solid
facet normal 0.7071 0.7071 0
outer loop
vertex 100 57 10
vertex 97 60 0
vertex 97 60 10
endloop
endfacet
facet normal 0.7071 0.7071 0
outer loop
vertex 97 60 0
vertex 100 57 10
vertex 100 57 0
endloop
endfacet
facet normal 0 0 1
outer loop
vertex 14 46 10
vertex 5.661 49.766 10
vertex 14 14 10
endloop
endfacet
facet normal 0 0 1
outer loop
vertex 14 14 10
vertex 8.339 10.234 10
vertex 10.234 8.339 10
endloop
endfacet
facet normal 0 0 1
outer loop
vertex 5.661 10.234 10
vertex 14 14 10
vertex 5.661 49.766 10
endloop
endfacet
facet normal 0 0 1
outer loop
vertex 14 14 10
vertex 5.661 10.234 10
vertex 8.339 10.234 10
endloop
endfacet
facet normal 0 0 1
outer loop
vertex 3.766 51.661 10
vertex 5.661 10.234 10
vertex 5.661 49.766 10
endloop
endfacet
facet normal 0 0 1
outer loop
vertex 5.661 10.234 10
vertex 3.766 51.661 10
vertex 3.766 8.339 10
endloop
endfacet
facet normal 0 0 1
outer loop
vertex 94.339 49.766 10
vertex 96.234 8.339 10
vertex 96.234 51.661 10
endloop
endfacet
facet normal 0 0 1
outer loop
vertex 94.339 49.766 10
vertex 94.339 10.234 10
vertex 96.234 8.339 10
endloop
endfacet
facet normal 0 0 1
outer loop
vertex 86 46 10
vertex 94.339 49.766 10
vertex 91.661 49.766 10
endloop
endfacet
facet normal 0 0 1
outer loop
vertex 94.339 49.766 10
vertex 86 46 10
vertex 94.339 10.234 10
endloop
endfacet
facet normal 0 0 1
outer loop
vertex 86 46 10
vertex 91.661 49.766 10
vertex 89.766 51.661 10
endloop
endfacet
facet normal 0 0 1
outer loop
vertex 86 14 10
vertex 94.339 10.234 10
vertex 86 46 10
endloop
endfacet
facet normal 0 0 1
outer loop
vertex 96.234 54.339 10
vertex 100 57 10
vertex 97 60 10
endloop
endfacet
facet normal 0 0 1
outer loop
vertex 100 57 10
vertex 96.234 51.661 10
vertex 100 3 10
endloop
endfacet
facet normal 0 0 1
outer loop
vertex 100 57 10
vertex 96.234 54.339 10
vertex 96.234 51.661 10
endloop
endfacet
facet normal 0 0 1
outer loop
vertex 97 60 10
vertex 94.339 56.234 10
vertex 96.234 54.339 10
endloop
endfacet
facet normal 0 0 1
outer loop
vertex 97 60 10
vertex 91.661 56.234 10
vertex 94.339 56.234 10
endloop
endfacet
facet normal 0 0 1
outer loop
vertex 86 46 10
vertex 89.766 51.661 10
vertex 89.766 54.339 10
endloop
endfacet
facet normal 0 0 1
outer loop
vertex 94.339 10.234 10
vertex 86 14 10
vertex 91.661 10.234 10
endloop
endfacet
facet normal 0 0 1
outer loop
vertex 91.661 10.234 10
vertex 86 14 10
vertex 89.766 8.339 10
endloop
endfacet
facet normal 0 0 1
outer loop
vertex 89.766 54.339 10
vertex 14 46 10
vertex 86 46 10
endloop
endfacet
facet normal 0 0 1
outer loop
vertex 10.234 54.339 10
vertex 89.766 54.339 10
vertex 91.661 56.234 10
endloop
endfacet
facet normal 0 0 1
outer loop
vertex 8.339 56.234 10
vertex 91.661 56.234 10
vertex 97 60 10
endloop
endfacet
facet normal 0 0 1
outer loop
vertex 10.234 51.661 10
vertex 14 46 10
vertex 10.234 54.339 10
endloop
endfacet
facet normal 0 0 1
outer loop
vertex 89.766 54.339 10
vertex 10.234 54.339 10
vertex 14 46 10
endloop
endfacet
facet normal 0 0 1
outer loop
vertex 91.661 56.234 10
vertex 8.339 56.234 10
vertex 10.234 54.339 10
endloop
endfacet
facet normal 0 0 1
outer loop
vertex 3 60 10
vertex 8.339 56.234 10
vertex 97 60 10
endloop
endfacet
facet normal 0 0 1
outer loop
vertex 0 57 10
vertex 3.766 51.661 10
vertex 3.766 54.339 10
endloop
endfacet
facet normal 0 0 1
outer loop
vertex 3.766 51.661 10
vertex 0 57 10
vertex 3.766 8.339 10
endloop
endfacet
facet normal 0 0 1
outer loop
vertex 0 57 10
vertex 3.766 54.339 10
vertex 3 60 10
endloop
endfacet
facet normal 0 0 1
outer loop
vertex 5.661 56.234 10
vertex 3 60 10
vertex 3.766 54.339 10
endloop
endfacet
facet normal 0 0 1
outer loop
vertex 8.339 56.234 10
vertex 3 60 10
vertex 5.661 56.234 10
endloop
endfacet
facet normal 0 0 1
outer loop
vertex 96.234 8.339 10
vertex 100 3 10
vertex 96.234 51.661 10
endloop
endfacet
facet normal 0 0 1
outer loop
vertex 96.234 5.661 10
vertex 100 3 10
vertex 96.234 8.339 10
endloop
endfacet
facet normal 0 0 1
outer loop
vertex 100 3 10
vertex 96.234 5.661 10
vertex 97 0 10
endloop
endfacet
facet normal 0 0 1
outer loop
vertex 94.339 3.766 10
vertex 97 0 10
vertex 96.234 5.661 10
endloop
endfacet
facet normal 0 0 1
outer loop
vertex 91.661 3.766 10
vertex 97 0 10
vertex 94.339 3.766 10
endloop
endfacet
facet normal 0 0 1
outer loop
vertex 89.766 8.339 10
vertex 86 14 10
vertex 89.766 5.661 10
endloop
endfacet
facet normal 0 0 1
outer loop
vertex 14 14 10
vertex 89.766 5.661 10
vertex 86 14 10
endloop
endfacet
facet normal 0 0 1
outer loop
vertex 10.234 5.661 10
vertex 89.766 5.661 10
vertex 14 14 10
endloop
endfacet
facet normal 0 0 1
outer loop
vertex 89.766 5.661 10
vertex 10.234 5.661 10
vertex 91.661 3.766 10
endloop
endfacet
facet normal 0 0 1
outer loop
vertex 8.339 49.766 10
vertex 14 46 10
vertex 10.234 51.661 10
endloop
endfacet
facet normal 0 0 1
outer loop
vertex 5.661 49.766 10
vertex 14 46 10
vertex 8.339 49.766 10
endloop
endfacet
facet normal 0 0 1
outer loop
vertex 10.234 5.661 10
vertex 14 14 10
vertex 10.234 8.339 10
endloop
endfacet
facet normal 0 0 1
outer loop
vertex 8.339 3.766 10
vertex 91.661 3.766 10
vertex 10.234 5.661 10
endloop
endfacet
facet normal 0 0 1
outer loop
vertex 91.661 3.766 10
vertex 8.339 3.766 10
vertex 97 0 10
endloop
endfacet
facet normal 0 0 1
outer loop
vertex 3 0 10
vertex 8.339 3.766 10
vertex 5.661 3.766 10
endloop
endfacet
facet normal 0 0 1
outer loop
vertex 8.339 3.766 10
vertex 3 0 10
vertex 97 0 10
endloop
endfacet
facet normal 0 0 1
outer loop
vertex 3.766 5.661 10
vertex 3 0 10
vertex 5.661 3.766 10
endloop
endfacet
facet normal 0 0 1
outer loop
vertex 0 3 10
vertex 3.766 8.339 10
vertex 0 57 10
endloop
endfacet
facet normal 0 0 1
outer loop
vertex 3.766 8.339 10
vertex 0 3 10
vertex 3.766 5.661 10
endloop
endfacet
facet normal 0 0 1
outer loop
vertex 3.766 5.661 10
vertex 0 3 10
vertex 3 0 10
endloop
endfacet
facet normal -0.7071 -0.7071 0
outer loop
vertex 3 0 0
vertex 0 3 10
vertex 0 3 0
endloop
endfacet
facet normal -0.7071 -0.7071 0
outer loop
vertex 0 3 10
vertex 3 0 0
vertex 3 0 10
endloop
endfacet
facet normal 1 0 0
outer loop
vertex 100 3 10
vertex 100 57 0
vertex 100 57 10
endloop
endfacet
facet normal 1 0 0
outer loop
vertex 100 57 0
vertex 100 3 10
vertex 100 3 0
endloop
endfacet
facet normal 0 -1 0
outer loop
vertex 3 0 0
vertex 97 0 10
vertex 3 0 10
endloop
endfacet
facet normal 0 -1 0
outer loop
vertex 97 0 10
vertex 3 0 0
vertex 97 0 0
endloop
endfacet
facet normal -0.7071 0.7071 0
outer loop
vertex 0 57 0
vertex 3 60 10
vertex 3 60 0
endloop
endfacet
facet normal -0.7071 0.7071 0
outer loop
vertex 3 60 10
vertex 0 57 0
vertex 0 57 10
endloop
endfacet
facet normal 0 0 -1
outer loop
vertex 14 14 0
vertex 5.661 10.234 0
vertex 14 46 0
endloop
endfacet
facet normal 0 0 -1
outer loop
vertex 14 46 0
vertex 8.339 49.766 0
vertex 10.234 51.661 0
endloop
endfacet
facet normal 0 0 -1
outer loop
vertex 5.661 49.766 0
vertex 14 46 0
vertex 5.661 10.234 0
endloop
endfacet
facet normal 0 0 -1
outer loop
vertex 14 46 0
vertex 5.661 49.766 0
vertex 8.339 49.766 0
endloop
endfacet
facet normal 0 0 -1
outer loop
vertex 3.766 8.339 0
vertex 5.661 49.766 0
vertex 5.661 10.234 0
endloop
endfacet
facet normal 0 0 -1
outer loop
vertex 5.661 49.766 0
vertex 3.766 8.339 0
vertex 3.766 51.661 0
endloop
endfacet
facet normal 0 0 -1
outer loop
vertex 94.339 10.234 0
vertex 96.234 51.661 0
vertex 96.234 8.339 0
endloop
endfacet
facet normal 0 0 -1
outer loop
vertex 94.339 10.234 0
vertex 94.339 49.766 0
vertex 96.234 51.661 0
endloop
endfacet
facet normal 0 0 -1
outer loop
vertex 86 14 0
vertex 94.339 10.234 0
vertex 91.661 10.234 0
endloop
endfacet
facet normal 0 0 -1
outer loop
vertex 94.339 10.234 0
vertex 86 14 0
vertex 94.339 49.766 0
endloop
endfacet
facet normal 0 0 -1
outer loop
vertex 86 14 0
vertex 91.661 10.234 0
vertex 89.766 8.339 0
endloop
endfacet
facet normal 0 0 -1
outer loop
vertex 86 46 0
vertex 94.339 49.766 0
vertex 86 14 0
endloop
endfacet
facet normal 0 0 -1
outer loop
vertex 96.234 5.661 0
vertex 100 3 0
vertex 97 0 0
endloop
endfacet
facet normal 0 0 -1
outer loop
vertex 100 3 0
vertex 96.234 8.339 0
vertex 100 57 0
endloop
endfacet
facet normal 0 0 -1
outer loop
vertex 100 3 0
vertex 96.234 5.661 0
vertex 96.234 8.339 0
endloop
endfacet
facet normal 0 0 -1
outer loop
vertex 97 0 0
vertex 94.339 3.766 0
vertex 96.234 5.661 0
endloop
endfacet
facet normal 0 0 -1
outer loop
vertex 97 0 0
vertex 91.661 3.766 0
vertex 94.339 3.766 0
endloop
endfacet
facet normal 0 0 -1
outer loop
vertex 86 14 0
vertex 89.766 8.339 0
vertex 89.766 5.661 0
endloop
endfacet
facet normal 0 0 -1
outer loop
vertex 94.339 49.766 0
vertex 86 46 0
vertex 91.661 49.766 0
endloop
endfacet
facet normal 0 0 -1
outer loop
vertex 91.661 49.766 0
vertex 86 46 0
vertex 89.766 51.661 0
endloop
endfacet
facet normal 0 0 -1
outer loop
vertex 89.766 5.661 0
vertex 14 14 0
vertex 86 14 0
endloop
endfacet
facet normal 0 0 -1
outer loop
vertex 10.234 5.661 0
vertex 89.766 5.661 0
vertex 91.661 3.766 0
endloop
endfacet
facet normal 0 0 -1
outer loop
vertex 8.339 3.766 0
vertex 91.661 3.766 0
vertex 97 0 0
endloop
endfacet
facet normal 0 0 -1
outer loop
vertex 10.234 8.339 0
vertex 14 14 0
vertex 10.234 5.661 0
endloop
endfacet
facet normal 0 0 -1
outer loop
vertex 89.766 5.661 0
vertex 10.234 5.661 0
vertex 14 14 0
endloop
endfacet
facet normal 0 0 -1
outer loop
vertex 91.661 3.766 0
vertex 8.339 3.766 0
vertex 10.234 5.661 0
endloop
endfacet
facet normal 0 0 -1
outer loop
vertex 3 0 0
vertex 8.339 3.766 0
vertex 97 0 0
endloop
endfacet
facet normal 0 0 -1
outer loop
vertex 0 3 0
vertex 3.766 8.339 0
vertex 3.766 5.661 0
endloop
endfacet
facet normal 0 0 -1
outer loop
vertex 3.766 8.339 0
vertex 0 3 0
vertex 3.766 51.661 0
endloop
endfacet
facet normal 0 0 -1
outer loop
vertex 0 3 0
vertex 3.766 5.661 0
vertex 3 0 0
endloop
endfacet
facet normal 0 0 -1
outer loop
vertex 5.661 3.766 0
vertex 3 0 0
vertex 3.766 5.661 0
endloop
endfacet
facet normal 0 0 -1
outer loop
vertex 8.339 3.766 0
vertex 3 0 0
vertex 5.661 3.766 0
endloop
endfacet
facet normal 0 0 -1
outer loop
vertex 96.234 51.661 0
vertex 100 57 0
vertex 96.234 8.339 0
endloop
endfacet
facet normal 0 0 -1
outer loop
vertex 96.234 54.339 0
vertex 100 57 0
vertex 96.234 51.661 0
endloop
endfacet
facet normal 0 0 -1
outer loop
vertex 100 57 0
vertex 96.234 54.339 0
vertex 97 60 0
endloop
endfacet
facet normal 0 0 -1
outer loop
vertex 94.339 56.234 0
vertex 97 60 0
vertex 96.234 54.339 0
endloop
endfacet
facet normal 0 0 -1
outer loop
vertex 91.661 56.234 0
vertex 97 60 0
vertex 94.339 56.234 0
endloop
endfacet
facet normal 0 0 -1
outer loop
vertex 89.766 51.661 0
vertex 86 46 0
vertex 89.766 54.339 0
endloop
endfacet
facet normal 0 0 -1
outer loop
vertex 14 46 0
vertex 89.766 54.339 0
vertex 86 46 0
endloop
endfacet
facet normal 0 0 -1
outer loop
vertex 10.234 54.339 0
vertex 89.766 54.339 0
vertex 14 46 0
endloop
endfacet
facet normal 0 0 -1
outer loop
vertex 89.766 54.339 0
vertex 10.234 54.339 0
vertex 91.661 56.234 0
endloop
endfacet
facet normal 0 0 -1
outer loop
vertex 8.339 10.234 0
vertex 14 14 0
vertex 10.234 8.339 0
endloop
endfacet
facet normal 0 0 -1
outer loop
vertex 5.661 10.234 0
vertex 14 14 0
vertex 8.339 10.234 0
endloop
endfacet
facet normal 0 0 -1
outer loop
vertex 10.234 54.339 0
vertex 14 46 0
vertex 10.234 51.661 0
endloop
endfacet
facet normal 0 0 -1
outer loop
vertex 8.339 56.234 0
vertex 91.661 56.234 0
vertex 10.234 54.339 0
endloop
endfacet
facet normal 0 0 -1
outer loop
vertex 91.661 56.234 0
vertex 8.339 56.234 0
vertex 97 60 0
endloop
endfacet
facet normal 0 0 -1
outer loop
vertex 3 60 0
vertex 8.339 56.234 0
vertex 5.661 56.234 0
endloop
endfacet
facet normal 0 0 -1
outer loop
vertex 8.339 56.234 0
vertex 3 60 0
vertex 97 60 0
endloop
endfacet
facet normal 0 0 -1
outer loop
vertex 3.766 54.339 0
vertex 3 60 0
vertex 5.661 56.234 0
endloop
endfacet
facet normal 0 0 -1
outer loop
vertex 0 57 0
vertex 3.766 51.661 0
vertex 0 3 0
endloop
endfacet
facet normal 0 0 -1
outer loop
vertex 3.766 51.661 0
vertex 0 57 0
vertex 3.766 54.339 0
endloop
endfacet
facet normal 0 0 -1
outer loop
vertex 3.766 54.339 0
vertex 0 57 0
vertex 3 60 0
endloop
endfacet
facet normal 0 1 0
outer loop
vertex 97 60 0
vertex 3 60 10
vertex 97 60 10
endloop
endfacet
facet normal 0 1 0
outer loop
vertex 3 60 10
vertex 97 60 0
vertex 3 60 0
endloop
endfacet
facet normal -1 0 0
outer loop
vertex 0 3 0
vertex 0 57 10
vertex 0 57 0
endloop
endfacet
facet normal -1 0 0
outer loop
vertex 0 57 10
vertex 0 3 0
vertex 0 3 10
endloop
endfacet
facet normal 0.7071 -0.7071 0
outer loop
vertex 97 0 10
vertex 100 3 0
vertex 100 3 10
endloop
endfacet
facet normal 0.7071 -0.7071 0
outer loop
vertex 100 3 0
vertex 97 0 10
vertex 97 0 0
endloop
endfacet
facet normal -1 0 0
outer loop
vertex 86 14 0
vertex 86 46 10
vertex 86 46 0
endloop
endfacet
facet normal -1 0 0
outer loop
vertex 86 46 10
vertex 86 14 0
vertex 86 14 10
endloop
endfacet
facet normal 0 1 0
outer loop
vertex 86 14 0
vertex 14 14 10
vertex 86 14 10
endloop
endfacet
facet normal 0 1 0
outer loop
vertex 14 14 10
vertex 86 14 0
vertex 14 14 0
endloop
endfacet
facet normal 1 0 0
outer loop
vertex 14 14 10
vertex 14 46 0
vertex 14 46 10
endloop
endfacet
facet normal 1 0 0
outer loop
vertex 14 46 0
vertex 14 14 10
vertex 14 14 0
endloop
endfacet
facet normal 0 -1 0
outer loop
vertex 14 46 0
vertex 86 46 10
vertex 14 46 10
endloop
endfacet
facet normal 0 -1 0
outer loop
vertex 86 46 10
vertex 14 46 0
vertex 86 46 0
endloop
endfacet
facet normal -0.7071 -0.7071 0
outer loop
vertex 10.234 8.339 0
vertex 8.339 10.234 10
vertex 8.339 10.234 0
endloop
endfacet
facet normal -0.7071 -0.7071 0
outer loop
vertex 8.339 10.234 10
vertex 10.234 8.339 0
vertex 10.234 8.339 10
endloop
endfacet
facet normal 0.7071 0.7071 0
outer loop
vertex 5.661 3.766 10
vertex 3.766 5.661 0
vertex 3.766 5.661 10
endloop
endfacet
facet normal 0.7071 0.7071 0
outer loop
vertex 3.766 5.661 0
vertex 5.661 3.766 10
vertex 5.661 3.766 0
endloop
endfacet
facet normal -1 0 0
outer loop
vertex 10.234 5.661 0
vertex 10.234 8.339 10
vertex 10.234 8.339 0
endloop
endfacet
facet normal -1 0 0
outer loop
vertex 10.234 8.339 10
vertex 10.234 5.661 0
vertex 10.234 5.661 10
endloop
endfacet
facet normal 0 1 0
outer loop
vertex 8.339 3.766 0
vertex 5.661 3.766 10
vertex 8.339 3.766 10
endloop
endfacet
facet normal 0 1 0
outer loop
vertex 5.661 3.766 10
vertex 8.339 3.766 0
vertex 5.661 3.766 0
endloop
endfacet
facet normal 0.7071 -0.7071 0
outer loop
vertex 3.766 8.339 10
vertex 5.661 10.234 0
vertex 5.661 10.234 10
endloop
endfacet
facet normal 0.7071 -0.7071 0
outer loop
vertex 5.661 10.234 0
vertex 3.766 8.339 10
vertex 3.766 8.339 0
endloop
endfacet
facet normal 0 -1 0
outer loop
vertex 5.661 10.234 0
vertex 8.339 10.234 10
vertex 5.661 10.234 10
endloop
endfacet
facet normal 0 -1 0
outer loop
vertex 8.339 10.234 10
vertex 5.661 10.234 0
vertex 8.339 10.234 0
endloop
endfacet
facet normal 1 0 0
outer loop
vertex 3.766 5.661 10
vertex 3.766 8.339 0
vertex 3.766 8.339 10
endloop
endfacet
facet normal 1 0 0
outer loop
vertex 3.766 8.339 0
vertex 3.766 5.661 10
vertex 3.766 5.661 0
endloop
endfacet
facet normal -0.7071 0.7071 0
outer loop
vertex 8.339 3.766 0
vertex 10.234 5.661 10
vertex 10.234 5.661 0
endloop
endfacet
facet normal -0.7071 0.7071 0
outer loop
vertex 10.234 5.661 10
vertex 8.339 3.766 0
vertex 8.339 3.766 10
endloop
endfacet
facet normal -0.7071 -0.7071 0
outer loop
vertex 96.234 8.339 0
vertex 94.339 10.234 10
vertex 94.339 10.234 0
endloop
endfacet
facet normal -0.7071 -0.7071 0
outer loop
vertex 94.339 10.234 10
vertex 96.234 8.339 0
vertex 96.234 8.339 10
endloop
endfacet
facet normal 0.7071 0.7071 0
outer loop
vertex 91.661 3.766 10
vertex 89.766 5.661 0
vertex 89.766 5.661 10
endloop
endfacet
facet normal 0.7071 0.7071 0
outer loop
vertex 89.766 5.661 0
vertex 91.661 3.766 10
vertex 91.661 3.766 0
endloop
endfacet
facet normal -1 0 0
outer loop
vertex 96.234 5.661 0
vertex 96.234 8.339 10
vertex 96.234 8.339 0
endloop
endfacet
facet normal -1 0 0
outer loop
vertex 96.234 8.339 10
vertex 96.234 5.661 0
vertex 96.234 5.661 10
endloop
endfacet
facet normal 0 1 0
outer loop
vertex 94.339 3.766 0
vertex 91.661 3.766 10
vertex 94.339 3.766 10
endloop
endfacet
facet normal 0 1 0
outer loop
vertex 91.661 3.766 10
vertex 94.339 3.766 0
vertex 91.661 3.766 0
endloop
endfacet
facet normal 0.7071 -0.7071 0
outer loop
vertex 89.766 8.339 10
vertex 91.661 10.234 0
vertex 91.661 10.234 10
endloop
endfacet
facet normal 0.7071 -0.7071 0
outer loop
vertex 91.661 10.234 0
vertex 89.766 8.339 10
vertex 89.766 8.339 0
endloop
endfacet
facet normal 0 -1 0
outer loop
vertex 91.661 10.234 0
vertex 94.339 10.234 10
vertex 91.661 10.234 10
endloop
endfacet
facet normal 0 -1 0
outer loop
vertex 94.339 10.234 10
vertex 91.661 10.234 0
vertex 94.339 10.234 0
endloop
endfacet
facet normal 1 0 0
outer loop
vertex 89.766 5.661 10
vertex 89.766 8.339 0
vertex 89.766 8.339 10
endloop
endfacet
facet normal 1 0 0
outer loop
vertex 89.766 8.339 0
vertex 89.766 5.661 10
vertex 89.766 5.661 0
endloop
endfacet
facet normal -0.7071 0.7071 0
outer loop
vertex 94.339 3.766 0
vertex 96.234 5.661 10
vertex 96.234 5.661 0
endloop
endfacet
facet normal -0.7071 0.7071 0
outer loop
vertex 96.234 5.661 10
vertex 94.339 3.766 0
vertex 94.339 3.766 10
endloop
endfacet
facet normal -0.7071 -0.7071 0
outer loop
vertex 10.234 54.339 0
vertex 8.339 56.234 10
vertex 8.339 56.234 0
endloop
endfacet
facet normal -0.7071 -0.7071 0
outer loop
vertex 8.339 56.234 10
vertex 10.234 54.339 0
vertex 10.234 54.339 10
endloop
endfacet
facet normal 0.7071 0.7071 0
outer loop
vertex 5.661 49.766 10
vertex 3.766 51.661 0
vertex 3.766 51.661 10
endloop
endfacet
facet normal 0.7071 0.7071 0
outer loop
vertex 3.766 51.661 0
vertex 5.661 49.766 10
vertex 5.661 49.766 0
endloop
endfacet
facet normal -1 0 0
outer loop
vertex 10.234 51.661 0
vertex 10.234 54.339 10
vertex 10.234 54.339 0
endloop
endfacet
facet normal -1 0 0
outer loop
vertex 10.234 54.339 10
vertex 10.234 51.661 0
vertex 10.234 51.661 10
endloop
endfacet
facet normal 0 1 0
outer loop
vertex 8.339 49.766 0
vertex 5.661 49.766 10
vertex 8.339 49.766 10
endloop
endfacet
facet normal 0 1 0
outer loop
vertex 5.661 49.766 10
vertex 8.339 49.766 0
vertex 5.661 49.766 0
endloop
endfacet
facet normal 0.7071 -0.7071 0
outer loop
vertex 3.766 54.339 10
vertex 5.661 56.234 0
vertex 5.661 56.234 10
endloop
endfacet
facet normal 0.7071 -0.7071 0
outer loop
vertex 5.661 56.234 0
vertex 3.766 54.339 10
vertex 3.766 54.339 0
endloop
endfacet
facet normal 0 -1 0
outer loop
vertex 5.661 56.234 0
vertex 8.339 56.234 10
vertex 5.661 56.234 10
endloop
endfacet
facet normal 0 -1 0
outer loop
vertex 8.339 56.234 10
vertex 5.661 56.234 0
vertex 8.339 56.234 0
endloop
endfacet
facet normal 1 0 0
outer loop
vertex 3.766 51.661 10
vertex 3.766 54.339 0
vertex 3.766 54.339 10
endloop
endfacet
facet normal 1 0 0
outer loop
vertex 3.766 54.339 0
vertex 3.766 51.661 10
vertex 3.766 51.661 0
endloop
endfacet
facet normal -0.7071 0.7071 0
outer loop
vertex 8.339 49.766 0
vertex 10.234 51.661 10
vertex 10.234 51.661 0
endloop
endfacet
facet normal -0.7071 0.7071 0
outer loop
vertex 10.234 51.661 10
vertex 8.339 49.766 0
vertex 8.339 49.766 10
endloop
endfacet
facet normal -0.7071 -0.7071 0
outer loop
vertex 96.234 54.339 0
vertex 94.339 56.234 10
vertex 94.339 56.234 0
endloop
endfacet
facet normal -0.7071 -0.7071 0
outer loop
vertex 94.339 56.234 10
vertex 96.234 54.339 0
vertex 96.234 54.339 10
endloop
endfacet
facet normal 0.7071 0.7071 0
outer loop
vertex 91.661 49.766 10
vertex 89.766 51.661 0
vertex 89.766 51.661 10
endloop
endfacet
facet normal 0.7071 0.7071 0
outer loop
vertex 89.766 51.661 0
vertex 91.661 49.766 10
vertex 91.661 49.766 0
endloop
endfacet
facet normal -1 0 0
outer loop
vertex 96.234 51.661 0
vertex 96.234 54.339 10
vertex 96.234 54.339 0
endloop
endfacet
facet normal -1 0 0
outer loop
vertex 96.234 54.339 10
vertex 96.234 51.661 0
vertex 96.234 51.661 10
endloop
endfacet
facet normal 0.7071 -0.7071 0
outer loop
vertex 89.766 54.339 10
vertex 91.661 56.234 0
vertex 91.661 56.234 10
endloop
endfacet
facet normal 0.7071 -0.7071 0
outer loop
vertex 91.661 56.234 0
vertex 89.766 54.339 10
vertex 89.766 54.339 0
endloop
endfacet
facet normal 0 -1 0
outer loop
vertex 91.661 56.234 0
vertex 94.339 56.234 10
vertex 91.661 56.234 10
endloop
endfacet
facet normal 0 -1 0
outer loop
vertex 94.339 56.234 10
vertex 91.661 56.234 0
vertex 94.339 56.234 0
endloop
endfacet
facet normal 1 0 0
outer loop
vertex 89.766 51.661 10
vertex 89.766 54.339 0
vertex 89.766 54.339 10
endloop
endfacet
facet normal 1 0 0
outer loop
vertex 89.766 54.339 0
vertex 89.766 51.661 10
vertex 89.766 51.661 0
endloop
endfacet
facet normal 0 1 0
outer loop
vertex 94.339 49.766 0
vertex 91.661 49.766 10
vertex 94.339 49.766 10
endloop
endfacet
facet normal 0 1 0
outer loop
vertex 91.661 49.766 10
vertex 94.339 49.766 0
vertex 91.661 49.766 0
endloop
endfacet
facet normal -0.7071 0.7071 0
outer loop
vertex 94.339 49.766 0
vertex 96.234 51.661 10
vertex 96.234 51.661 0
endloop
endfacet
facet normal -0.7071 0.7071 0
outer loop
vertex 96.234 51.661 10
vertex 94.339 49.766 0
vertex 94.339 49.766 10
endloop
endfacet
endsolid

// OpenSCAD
$fn = 32;

// ----------------------------------------------------------------------
// Frame plate: 100 x 60 frame, 14 mm rails
// ----------------------------------------------------------------------

// --- parameters (mm) ---
plate_l = 100;            // plate length, X
plate_w = 60;             // plate width, Y
plate_t = 10;             // plate thickness, Z (extrusion height)
corner_c = 3;             // corner chamfer
frame_bar = 14;           // frame rail width
bolt_r = 3.5;             // corner bolt window radius
bolt_inset = 7;           // bolt centre inset from the edges
fit_tol = 0.05;           // declared fit tolerance (prompt contract)
free_tol = 0.3;           // declared free tolerance (prompt contract)

win_l = plate_l - 2 * frame_bar;  // window length
win_w = plate_w - 2 * frame_bar;  // window width
bolt_d = 2 * bolt_r;  // corner hole diameter

profile = [[3, 0], [97, 0], [100, 3], [100, 57], [97, 60], [3, 60], [0, 57], [0, 3]];  // primary outline, 8 points, counter clockwise
void_1 = [[14, 14], [86, 14], [86, 46], [14, 46]];  // the window, 4 points
void_2 = [[10.234, 8.339], [8.339, 10.234], [5.661, 10.234], [3.766, 8.339], [3.766, 5.661], [5.661, 3.766], [8.339, 3.766], [10.234, 5.661]];  // corner bolt window, 8 points
void_3 = [[96.234, 8.339], [94.339, 10.234], [91.661, 10.234], [89.766, 8.339], [89.766, 5.661], [91.661, 3.766], [94.339, 3.766], [96.234, 5.661]];  // corner bolt window, 8 points
void_4 = [[10.234, 54.339], [8.339, 56.234], [5.661, 56.234], [3.766, 54.339], [3.766, 51.661], [5.661, 49.766], [8.339, 49.766], [10.234, 51.661]];  // corner bolt window, 8 points
void_5 = [[96.234, 54.339], [94.339, 56.234], [91.661, 56.234], [89.766, 54.339], [89.766, 51.661], [91.661, 49.766], [94.339, 49.766], [96.234, 51.661]];  // corner bolt window, 8 points

// --- the one profile operation ---
difference() {
  linear_extrude(height = plate_t) polygon(points = profile);
  translate([0, 0, -1])
    linear_extrude(height = plate_t + 2) polygon(points = void_1);
  translate([0, 0, -1])
    linear_extrude(height = plate_t + 2) polygon(points = void_2);
  translate([0, 0, -1])
    linear_extrude(height = plate_t + 2) polygon(points = void_3);
  translate([0, 0, -1])
    linear_extrude(height = plate_t + 2) polygon(points = void_4);
  translate([0, 0, -1])
    linear_extrude(height = plate_t + 2) polygon(points = void_5);
}
